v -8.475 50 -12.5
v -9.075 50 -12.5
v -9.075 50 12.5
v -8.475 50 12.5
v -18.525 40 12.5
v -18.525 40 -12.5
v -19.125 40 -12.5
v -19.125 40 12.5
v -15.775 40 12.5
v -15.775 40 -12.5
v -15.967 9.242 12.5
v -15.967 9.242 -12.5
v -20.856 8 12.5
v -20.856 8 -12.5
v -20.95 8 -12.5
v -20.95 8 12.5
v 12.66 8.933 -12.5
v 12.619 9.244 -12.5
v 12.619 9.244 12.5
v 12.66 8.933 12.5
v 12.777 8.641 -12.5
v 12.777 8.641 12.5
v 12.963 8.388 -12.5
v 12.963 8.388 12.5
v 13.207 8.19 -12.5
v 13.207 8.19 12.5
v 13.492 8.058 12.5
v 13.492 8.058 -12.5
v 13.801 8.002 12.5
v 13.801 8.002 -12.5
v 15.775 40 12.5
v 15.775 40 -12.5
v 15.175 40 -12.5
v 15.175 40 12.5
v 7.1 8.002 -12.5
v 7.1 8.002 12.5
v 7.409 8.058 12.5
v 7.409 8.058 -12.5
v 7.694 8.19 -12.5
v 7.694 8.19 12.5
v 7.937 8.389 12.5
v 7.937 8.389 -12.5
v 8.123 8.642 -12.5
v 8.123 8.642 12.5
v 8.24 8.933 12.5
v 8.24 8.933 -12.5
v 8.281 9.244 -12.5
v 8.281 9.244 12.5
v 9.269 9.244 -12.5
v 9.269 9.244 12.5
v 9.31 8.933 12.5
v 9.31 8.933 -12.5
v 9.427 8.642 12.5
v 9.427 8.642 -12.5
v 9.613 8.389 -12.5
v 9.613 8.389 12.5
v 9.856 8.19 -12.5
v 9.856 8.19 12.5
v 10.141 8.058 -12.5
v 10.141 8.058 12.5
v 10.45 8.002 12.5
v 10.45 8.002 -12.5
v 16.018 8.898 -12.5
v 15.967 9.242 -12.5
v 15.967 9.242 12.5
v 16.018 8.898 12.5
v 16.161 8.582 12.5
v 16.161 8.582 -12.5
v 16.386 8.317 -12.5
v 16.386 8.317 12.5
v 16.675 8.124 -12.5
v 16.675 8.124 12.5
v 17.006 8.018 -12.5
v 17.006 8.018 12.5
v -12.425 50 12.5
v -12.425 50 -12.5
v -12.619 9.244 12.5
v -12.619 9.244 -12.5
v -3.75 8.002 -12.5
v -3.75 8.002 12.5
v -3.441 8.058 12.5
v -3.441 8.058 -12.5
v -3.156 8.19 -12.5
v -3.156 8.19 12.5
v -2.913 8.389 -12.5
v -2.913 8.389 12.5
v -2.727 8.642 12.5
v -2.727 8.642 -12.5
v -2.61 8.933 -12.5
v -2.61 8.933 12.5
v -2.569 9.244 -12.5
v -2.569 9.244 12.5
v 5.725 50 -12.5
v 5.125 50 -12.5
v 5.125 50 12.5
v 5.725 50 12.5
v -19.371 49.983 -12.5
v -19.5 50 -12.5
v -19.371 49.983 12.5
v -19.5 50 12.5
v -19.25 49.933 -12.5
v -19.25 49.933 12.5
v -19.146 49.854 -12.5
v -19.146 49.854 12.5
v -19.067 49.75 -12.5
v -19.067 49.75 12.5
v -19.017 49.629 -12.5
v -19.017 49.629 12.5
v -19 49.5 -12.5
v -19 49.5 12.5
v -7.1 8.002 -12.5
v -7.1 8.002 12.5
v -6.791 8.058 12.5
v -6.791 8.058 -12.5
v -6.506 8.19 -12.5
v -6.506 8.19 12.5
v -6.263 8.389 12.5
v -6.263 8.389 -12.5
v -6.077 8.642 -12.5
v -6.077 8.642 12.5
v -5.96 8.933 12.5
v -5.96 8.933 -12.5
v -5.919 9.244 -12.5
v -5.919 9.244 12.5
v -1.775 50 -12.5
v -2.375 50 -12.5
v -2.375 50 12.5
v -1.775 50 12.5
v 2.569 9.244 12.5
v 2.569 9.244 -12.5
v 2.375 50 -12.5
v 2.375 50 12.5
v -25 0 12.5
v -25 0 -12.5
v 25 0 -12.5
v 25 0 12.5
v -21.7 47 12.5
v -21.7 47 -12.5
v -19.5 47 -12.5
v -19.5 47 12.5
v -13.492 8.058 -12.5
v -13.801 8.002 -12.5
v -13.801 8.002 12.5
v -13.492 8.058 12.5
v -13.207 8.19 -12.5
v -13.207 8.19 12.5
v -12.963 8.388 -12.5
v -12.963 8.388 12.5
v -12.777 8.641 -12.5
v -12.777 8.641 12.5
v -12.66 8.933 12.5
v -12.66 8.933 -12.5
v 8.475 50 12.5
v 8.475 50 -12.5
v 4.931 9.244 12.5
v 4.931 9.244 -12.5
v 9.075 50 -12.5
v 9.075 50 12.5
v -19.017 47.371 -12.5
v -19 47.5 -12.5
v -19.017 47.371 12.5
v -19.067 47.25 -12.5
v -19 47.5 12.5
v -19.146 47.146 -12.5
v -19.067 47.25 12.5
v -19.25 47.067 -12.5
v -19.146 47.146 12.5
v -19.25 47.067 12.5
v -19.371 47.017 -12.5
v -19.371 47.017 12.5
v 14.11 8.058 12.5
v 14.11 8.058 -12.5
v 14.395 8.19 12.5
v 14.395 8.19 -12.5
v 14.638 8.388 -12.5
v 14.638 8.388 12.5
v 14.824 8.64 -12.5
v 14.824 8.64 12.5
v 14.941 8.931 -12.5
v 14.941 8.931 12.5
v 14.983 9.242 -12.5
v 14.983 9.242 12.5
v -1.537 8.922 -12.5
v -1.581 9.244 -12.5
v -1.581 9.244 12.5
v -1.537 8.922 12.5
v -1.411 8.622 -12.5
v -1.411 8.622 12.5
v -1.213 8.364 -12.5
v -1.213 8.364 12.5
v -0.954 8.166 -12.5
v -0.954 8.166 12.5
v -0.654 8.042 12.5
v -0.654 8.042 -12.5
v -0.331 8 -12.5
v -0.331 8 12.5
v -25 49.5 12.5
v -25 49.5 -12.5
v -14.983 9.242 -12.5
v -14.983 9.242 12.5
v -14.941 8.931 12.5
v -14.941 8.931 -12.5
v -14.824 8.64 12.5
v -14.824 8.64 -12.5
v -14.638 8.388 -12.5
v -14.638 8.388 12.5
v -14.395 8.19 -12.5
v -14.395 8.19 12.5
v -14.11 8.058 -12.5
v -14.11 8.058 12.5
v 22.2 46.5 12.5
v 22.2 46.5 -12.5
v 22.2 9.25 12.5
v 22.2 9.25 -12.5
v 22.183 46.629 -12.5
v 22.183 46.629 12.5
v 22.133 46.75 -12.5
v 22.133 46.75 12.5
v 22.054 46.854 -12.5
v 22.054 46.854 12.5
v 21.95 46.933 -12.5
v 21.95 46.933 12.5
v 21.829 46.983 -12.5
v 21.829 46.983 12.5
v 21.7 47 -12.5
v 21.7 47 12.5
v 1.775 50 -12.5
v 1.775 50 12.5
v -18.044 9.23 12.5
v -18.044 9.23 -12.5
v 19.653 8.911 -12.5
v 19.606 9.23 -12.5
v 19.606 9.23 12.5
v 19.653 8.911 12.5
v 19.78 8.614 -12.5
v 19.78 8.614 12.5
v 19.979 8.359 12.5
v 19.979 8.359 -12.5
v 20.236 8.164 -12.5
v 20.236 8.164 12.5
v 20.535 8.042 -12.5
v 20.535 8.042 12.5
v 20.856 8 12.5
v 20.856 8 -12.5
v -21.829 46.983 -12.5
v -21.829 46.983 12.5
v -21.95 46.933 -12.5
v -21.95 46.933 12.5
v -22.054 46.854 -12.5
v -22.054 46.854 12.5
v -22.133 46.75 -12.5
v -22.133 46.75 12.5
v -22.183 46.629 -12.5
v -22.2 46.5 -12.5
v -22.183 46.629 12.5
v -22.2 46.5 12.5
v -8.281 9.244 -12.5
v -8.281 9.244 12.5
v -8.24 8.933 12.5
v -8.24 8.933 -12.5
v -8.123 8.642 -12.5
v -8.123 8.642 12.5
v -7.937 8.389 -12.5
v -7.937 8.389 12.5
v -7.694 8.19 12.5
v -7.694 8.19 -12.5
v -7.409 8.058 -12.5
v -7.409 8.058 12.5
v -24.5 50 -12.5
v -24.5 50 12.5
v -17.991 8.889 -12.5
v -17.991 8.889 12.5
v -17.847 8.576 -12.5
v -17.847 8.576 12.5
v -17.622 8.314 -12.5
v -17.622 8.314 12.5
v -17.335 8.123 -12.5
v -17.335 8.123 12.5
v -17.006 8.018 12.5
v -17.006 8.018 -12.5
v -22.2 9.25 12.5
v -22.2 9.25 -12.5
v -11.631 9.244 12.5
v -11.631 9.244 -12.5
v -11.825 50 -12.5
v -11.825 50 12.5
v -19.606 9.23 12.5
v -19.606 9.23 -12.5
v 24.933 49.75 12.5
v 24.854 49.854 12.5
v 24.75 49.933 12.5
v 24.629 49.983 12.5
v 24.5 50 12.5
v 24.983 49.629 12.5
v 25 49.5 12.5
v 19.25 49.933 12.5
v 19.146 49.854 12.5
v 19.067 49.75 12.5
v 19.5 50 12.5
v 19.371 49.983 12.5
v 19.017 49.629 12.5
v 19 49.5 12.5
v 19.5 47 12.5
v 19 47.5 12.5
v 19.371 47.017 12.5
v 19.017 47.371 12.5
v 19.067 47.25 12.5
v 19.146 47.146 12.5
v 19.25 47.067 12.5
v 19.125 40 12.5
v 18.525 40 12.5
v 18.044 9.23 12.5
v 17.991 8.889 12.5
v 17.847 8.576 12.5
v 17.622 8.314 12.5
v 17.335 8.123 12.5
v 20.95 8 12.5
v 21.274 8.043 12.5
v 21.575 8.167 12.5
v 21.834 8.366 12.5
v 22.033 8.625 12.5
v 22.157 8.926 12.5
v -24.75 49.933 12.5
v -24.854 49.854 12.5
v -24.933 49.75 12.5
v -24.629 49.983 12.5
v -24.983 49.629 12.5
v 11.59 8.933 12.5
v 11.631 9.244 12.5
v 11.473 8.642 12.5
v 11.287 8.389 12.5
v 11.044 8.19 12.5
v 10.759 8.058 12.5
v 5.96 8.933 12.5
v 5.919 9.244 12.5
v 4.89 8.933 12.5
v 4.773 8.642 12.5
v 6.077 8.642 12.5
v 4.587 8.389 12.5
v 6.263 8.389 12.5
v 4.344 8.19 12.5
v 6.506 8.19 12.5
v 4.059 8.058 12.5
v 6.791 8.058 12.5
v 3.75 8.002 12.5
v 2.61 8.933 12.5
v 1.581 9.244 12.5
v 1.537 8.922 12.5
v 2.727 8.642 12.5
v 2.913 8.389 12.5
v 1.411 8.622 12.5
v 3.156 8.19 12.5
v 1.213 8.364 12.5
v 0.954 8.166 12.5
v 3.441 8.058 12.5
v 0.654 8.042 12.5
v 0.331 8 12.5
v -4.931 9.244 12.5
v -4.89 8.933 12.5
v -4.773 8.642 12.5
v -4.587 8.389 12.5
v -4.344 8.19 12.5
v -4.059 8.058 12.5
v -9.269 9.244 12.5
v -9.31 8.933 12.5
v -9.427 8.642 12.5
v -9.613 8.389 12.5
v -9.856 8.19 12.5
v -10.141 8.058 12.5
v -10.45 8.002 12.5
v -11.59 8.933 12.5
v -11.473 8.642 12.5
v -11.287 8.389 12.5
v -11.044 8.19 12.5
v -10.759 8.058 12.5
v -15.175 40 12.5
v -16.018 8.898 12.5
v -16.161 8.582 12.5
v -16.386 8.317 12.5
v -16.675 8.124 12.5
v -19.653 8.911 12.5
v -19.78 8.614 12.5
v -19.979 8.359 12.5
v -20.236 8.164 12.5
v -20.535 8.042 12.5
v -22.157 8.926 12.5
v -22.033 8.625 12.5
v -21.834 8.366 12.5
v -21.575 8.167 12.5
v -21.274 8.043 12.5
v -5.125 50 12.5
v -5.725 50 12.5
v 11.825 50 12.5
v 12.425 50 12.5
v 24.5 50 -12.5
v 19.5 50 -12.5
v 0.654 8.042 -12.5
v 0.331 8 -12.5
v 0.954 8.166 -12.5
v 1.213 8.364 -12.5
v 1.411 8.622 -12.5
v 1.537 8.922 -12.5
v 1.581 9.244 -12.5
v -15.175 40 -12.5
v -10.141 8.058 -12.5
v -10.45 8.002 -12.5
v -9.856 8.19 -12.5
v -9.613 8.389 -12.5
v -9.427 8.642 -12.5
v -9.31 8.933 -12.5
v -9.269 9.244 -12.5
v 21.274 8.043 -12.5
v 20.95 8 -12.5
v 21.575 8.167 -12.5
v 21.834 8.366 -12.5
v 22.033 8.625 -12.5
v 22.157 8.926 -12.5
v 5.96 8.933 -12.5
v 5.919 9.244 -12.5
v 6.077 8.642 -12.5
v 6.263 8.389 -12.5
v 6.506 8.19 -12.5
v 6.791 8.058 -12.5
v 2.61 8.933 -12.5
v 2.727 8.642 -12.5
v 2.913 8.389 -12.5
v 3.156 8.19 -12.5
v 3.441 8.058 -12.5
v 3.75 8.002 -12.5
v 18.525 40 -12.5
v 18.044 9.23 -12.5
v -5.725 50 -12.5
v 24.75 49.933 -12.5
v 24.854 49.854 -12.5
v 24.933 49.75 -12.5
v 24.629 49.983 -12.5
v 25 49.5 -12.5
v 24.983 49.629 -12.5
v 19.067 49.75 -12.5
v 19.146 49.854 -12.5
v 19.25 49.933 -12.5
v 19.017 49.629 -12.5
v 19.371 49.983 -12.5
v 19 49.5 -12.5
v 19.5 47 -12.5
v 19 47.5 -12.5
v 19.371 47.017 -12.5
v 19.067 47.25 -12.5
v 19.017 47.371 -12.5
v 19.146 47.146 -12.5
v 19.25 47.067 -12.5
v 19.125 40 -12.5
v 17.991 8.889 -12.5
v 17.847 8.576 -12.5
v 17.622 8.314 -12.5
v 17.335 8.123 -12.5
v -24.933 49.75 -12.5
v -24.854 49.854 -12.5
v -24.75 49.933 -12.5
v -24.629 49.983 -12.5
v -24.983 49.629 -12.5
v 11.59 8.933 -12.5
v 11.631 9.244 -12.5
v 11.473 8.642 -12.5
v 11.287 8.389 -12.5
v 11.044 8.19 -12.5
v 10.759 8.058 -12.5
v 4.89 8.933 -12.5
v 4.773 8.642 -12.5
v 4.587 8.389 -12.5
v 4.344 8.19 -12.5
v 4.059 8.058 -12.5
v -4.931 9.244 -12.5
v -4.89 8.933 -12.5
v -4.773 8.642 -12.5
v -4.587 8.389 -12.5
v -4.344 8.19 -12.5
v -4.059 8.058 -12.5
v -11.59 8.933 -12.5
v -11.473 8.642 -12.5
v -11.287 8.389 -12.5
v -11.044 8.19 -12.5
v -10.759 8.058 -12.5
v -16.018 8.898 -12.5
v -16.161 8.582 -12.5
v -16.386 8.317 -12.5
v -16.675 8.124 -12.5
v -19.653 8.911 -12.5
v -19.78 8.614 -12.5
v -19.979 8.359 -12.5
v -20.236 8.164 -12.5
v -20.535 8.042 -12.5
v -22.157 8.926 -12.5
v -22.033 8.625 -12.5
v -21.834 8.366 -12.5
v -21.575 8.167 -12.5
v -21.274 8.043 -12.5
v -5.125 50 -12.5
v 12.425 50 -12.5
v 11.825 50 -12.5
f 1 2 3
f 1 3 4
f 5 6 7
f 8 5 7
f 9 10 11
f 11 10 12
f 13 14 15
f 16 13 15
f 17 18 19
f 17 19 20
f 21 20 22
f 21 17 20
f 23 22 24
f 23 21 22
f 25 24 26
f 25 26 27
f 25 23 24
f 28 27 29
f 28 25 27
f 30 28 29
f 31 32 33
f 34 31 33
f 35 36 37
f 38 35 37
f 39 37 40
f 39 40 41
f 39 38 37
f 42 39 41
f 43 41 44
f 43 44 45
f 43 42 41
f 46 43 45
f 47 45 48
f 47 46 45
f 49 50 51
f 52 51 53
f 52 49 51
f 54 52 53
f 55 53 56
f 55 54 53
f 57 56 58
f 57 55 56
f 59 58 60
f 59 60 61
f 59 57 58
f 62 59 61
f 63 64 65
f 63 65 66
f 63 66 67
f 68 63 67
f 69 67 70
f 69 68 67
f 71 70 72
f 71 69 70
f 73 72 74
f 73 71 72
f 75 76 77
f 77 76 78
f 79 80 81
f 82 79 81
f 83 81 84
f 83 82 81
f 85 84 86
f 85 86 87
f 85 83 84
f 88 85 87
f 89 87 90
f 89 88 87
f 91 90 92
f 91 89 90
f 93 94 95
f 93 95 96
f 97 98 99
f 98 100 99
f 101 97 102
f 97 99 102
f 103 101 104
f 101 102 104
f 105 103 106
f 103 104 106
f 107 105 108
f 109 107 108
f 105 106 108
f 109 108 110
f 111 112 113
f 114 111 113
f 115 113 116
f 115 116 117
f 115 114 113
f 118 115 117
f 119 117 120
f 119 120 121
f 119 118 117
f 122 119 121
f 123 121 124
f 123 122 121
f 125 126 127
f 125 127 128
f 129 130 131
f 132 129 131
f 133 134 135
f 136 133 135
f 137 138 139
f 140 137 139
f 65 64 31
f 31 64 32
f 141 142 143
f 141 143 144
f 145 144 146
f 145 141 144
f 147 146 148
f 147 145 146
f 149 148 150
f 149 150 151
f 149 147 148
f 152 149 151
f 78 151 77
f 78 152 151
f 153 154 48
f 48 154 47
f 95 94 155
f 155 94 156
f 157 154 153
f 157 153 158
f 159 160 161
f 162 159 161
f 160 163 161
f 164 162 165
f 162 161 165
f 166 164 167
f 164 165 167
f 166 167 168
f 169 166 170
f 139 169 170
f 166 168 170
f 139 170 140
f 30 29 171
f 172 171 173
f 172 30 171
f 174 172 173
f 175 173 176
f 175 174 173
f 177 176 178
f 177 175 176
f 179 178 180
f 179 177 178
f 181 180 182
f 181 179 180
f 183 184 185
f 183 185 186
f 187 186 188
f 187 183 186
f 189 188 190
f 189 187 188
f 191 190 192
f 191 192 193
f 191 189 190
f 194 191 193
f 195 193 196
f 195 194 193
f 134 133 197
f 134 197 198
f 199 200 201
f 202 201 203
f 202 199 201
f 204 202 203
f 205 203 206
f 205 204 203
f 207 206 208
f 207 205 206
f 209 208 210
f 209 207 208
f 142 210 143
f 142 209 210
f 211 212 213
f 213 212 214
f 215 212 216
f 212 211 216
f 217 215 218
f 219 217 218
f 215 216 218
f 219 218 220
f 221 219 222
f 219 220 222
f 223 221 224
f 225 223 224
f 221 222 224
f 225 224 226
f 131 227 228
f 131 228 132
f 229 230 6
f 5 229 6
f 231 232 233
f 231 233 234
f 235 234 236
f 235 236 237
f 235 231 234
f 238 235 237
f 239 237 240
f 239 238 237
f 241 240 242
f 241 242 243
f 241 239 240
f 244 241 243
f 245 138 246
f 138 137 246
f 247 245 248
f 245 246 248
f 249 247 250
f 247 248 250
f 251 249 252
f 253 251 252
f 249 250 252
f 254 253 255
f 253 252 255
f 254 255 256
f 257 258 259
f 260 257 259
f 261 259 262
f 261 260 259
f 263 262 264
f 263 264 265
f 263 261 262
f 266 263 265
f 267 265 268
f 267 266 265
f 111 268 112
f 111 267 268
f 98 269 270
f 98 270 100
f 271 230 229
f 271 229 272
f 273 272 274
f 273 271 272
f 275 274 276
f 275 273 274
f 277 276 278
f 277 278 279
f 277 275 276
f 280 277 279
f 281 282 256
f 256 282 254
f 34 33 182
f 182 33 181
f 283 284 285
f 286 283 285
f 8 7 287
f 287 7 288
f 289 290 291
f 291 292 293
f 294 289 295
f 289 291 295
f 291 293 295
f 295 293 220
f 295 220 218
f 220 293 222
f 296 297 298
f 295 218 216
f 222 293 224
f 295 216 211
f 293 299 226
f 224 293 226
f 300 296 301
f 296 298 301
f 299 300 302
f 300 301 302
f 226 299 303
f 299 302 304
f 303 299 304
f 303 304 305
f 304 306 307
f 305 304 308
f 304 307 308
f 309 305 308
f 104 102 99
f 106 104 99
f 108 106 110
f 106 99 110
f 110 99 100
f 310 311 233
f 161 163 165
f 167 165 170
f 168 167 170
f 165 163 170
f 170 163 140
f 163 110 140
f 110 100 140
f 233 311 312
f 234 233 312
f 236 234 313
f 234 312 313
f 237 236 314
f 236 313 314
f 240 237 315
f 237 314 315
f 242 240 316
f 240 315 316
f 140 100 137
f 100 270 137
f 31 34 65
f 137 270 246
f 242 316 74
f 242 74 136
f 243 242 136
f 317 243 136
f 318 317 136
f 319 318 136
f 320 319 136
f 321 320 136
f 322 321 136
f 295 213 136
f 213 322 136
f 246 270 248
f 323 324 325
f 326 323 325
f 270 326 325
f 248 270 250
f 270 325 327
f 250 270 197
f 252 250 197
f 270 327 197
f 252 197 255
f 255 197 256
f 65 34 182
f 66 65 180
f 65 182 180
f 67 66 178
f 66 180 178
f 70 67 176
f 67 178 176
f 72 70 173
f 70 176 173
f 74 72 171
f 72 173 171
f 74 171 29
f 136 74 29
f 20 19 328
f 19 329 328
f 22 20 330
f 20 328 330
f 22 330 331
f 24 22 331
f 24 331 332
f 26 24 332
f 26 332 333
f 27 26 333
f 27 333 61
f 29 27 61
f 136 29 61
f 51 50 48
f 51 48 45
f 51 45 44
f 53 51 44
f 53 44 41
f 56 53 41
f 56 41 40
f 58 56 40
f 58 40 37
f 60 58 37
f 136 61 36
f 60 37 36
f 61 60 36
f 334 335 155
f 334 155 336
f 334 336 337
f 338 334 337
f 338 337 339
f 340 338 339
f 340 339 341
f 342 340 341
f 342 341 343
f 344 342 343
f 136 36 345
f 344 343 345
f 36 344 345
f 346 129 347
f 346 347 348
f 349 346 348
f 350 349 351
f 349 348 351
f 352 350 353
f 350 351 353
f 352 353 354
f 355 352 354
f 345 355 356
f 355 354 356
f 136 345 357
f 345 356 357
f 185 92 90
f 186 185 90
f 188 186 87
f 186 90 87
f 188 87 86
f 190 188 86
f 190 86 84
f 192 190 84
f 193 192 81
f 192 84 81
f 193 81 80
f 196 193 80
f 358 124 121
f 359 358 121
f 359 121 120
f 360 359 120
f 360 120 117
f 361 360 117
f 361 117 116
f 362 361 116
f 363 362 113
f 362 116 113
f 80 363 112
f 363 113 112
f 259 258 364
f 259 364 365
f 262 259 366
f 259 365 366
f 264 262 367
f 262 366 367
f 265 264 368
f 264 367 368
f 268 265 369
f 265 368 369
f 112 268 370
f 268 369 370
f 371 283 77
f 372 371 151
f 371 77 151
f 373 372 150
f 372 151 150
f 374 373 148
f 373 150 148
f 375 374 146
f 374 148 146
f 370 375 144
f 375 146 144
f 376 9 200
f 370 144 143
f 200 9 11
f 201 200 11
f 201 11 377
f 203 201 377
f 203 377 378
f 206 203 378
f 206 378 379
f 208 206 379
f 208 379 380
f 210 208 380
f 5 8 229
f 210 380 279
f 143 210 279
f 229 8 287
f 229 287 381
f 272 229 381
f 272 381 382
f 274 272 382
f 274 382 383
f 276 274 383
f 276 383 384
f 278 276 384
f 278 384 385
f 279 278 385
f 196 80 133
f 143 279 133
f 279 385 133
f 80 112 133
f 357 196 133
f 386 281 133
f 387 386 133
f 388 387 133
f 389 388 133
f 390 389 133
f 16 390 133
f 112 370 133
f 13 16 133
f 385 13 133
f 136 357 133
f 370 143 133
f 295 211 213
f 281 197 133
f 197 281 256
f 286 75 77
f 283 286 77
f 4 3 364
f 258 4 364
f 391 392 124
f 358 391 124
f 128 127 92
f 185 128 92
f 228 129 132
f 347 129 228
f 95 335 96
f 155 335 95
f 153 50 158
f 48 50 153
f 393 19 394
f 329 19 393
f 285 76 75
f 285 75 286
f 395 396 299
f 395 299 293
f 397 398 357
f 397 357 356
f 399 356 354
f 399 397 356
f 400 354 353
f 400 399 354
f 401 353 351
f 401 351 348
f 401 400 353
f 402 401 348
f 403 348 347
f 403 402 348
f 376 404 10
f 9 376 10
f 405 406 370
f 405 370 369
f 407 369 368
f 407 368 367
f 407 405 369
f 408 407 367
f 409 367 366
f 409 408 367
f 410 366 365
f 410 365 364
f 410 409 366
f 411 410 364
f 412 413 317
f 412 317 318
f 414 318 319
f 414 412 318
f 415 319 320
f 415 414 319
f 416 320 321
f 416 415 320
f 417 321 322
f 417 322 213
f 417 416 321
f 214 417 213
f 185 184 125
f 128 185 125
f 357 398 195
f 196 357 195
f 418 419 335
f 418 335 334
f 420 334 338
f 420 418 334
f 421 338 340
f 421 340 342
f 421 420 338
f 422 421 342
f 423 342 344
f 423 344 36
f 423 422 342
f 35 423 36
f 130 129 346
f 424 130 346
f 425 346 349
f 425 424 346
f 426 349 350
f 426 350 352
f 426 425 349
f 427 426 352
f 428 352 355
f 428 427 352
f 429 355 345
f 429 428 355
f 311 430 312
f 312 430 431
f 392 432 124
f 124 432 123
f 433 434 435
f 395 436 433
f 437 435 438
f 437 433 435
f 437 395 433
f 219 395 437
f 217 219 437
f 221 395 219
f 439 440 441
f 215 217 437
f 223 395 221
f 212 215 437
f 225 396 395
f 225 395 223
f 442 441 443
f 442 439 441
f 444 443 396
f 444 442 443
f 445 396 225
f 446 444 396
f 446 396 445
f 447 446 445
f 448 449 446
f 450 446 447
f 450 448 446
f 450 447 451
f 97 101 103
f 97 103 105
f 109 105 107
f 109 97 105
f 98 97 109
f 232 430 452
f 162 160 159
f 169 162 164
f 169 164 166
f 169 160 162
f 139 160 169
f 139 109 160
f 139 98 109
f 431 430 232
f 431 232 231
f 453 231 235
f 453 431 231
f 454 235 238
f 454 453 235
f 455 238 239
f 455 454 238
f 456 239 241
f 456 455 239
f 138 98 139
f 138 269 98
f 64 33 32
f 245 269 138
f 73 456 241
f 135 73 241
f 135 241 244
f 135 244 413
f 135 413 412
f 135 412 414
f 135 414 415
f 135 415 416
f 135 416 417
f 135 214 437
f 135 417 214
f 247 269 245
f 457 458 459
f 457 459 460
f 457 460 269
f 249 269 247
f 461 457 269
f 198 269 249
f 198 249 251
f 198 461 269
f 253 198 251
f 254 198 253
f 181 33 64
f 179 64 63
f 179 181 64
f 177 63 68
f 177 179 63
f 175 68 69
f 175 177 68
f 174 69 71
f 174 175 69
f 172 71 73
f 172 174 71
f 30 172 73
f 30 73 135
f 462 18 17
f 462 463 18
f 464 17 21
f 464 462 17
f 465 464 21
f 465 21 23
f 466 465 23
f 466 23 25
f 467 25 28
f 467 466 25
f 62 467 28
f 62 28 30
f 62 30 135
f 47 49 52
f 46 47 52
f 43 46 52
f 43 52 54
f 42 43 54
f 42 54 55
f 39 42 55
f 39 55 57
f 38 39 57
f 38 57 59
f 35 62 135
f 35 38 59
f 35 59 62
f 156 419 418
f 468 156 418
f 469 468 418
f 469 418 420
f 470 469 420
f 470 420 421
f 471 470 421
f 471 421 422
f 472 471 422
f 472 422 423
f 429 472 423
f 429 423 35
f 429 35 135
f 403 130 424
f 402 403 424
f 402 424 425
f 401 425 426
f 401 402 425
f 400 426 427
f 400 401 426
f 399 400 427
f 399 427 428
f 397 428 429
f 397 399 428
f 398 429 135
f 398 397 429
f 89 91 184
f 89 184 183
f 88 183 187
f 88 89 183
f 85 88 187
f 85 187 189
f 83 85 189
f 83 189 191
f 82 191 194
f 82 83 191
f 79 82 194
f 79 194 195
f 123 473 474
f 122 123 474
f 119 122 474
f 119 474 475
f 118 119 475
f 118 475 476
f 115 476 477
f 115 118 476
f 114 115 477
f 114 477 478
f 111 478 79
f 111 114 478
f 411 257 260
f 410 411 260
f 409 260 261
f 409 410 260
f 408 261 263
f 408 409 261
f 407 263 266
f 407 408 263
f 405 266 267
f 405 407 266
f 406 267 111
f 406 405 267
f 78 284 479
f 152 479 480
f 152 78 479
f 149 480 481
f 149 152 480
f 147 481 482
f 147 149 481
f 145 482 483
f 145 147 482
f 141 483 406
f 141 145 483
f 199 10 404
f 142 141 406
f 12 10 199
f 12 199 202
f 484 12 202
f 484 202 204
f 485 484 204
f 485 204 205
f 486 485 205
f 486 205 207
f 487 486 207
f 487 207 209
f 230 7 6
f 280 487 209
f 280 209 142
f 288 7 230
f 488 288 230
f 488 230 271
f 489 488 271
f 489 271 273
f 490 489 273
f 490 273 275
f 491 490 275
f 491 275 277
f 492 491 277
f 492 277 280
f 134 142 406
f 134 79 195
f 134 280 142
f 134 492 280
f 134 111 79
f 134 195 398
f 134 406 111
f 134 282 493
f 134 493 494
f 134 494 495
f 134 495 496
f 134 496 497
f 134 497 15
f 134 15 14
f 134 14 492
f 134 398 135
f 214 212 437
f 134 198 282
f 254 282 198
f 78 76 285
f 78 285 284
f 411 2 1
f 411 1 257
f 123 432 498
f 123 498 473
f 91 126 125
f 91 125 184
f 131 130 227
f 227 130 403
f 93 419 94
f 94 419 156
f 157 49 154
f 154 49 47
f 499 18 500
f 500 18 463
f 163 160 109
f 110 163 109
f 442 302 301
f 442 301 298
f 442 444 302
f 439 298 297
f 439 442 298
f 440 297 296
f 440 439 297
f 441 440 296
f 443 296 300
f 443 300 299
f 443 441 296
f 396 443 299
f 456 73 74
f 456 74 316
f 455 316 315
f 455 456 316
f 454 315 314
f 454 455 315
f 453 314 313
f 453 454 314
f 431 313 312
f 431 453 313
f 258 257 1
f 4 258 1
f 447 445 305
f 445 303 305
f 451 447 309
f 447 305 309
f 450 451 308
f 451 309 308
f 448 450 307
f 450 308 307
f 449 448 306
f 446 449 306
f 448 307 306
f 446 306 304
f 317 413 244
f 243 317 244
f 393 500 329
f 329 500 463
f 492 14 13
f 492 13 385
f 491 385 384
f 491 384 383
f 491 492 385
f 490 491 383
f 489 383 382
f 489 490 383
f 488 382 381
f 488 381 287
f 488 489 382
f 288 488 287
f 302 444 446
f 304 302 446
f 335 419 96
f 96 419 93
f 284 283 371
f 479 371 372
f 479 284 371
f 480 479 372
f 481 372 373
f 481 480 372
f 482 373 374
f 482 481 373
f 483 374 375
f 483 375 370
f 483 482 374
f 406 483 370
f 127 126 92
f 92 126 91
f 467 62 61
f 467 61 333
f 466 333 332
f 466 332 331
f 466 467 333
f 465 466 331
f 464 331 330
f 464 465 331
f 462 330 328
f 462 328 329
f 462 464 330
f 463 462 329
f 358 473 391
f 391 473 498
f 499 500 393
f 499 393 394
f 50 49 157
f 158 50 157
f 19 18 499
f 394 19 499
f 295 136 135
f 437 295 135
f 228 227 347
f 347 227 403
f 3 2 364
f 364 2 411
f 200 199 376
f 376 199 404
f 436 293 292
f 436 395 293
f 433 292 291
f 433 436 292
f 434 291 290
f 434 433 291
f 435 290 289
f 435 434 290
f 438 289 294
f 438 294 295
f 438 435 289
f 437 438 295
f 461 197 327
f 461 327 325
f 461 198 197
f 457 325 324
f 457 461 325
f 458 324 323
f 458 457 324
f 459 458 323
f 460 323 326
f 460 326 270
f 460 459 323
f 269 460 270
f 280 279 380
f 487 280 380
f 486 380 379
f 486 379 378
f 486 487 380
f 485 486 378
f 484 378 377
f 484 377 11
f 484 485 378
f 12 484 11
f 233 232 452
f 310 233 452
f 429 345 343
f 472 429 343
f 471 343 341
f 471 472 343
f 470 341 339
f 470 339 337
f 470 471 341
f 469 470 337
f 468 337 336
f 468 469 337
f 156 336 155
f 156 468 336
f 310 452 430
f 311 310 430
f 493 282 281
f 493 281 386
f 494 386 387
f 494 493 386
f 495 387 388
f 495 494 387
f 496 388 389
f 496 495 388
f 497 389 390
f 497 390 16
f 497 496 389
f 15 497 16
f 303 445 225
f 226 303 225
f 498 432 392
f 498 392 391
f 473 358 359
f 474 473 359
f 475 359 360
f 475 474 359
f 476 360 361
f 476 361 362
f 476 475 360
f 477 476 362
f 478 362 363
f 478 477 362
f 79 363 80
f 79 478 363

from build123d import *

# Parameters (mm, degrees)
SKETCH_1_W          = 50
SKETCH_1_H          = 25
EXTRUDE_1_DEPTH     = 50
CUT_EXTRUDE_3_DEPTH = 62.23724357
FILLET_1_R          = 1.25
FILLET_2_R          = 0.5


with BuildPart() as part:
    # 草图1 → 拉伸1 (new body)
    with BuildSketch(Plane(origin=(0, 0, 0), x_dir=(1, 0, 0), z_dir=(0, 1, 0))):
        Rectangle(SKETCH_1_W, SKETCH_1_H)
    extrude(amount=EXTRUDE_1_DEPTH)

    # 草图3 → 切除-拉伸3 (cut, through all)
    with BuildSketch(Plane(origin=(0, 0, -12.5), x_dir=(-1, 0, 0), z_dir=(0, 0, -1))):
        Polygon((-19, 50), (-19, 47), (-22.2, 47), (-22.2, 8), (-19.625, 8), (-19.125, 40), (-18.525, 40), (-18.025, 8), (-15.975, 8), (-15.775, 40), (-15.175, 40), (-14.975, 8), (-12.625, 8), (-12.425, 50), (-11.825, 50), (-11.625, 8), (-9.275, 8), (-9.075, 50), (-8.475, 50), (-8.275, 8), (-5.925, 8), (-5.725, 50), (-5.125, 50), (-4.925, 8), (-2.575, 8), (-2.375, 50), (-1.775, 50), (-1.575, 8), (1.575, 8), (1.775, 50), (2.375, 50), (2.575, 8), (4.925, 8), (5.125, 50), (5.725, 50), (5.925, 8), (8.275, 8), (8.475, 50), (9.075, 50), (9.275, 8), (11.625, 8), (11.825, 50), (12.425, 50), (12.625, 8), (14.975, 8), (15.175, 40), (15.775, 40), (15.975, 8), (18.025, 8), (18.525, 40), (19.125, 40), (19.625, 8), (22.2, 8), (22.2, 47), (19, 47), (19, 50), (19, 55.346255007), (-19, 55.346255007), align=None)
    extrude(amount=-CUT_EXTRUDE_3_DEPTH, mode=Mode.SUBTRACT)

    # 圆角1
    # the kernel refuses this fillet: 1.25 mm, written as the material it adds along each edge
    with BuildSketch(Plane(origin=(-2.575, 8, -12.5), x_dir=(0.004761850772972935, 0.9999886623243365, 0), z_dir=(0, 0, 1)), Plane(origin=(-1.575, 8, -12.5), x_dir=(1, 0, 0), z_dir=(0, 0, 1)), Plane(origin=(1.575, 8, -12.5), x_dir=(0.004761850772973114, 0.9999886623243365, 0), z_dir=(0, 0, 1)), Plane(origin=(2.575, 8, -12.5), x_dir=(1, 0, 0), z_dir=(0, 0, 1)), Plane(origin=(4.925, 8, -12.5), x_dir=(0.004761850772972935, 0.9999886623243365, 0), z_dir=(0, 0, 1)), Plane(origin=(5.925, 8, -12.5), x_dir=(1, 0, 0), z_dir=(0, 0, 1)), Plane(origin=(8.275, 8, -12.5), x_dir=(0.004761850772972963, 0.9999886623243365, 0), z_dir=(0, 0, 1)), Plane(origin=(9.275, 8, -12.5), x_dir=(1, 0, 0), z_dir=(0, 0, 1)), Plane(origin=(11.625, 8, -12.5), x_dir=(0.004761850772972963, 0.9999886623243365, 0), z_dir=(0, 0, 1)), Plane(origin=(12.625, 8, -12.5), x_dir=(1, 0, 0), z_dir=(0, 0, 1)), Plane(origin=(-12.625, 8, -12.5), x_dir=(0.004761850772972963, 0.9999886623243365, 0), z_dir=(0, 0, 1)), Plane(origin=(-11.625, 8, -12.5), x_dir=(1, 0, 0), z_dir=(0, 0, 1)), Plane(origin=(-9.275, 8, -12.5), x_dir=(0.004761850772972963, 0.9999886623243365, 0), z_dir=(0, 0, 1)), Plane(origin=(-8.275, 8, -12.5), x_dir=(1, 0, 0), z_dir=(0, 0, 1)), Plane(origin=(-5.925, 8, -12.5), x_dir=(0.004761850772972935, 0.9999886623243365, 0), z_dir=(0, 0, 1)), Plane(origin=(-4.925, 8, -12.5), x_dir=(1, 0, 0), z_dir=(0, 0, 1))) as fillet_1_piece_1:
        with BuildLine():
            CenterArc((FILLET_1_R * 0.995249433042, FILLET_1_R), FILLET_1_R, 180.272834983, 89.727165017)
            Line((-FILLET_1_R * 0.00473922928203, FILLET_1_R * 0.995238149227), (0, 0))
            Line((0, 0), (FILLET_1_R * 0.995249433042, 0))
        make_face()
    extrude(amount=25)
    with BuildSketch(Plane(origin=(14.975, 8, -12.5), x_dir=(0.006249877933264038, 0.999980469322186, 0), z_dir=(0, 0, 1)), Plane(origin=(15.975, 8, -12.5), x_dir=(1, 0, 0), z_dir=(0, 0, 1)), Plane(origin=(-15.975, 8, -12.5), x_dir=(0.00624987793326402, 0.999980469322186, 0), z_dir=(0, 0, 1)), Plane(origin=(-14.975, 8, -12.5), x_dir=(1, 0, 0), z_dir=(0, 0, 1))) as fillet_1_piece_2:
        with BuildLine():
            CenterArc((FILLET_1_R * 0.993769531059, FILLET_1_R), FILLET_1_R, 180.358093959, 89.641906041)
            Line((-FILLET_1_R * 0.00621093826293, FILLET_1_R * 0.993750122067), (0, 0))
            Line((0, 0), (FILLET_1_R * 0.993769531059, 0))
        make_face()
    extrude(amount=25)
    with BuildSketch(Plane(origin=(18.025, 8, -12.5), x_dir=(0.015623093000541032, 0.9998779520346953, 0), z_dir=(0, 0, 1)), Plane(origin=(19.625, 8, -12.5), x_dir=(1, 0, 0), z_dir=(0, 0, 1)), Plane(origin=(-19.625, 8, -12.5), x_dir=(0.015623093000541032, 0.9998779520346953, 0), z_dir=(0, 0, 1)), Plane(origin=(-18.025, 8, -12.5), x_dir=(1, 0, 0), z_dir=(0, 0, 1))) as fillet_1_piece_3:
        with BuildLine():
            CenterArc((FILLET_1_R * 0.984497062863, FILLET_1_R), FILLET_1_R, 180.89517371, 89.10482629)
            Line((-FILLET_1_R * 0.0153808891719, FILLET_1_R * 0.984376906999), (0, 0))
            Line((0, 0), (FILLET_1_R * 0.984497062863, 0))
        make_face()
    extrude(amount=25)
    with BuildSketch(Plane(origin=(22.2, 8, -12.5), x_dir=(0, 1, 0), z_dir=(0, 0, 1)), Plane(origin=(-22.2, 8, -12.5), x_dir=(1, 0, 0), z_dir=(0, 0, 1))) as fillet_1_piece_4:
        with BuildLine():
            CenterArc((FILLET_1_R, FILLET_1_R), FILLET_1_R, 180, 90)
            Line((0, FILLET_1_R), (0, 0))
            Line((0, 0), (FILLET_1_R, 0))
        make_face()
    extrude(amount=25)

    # 圆角2
    fillet_2_edges = [part.edges().sort_by_distance(p)[0] for p in [
        (25, 50, 0),
        (22.2, 47, 0),
        (19, 47, 0),
        (19, 50, 0),
        (-19, 50, 0),
        (-25, 50, 0),
        (-19, 47, 0),
        (-22.2, 47, 0),
    ]]
    fillet(fillet_2_edges, radius=FILLET_2_R)


solid = part.part
